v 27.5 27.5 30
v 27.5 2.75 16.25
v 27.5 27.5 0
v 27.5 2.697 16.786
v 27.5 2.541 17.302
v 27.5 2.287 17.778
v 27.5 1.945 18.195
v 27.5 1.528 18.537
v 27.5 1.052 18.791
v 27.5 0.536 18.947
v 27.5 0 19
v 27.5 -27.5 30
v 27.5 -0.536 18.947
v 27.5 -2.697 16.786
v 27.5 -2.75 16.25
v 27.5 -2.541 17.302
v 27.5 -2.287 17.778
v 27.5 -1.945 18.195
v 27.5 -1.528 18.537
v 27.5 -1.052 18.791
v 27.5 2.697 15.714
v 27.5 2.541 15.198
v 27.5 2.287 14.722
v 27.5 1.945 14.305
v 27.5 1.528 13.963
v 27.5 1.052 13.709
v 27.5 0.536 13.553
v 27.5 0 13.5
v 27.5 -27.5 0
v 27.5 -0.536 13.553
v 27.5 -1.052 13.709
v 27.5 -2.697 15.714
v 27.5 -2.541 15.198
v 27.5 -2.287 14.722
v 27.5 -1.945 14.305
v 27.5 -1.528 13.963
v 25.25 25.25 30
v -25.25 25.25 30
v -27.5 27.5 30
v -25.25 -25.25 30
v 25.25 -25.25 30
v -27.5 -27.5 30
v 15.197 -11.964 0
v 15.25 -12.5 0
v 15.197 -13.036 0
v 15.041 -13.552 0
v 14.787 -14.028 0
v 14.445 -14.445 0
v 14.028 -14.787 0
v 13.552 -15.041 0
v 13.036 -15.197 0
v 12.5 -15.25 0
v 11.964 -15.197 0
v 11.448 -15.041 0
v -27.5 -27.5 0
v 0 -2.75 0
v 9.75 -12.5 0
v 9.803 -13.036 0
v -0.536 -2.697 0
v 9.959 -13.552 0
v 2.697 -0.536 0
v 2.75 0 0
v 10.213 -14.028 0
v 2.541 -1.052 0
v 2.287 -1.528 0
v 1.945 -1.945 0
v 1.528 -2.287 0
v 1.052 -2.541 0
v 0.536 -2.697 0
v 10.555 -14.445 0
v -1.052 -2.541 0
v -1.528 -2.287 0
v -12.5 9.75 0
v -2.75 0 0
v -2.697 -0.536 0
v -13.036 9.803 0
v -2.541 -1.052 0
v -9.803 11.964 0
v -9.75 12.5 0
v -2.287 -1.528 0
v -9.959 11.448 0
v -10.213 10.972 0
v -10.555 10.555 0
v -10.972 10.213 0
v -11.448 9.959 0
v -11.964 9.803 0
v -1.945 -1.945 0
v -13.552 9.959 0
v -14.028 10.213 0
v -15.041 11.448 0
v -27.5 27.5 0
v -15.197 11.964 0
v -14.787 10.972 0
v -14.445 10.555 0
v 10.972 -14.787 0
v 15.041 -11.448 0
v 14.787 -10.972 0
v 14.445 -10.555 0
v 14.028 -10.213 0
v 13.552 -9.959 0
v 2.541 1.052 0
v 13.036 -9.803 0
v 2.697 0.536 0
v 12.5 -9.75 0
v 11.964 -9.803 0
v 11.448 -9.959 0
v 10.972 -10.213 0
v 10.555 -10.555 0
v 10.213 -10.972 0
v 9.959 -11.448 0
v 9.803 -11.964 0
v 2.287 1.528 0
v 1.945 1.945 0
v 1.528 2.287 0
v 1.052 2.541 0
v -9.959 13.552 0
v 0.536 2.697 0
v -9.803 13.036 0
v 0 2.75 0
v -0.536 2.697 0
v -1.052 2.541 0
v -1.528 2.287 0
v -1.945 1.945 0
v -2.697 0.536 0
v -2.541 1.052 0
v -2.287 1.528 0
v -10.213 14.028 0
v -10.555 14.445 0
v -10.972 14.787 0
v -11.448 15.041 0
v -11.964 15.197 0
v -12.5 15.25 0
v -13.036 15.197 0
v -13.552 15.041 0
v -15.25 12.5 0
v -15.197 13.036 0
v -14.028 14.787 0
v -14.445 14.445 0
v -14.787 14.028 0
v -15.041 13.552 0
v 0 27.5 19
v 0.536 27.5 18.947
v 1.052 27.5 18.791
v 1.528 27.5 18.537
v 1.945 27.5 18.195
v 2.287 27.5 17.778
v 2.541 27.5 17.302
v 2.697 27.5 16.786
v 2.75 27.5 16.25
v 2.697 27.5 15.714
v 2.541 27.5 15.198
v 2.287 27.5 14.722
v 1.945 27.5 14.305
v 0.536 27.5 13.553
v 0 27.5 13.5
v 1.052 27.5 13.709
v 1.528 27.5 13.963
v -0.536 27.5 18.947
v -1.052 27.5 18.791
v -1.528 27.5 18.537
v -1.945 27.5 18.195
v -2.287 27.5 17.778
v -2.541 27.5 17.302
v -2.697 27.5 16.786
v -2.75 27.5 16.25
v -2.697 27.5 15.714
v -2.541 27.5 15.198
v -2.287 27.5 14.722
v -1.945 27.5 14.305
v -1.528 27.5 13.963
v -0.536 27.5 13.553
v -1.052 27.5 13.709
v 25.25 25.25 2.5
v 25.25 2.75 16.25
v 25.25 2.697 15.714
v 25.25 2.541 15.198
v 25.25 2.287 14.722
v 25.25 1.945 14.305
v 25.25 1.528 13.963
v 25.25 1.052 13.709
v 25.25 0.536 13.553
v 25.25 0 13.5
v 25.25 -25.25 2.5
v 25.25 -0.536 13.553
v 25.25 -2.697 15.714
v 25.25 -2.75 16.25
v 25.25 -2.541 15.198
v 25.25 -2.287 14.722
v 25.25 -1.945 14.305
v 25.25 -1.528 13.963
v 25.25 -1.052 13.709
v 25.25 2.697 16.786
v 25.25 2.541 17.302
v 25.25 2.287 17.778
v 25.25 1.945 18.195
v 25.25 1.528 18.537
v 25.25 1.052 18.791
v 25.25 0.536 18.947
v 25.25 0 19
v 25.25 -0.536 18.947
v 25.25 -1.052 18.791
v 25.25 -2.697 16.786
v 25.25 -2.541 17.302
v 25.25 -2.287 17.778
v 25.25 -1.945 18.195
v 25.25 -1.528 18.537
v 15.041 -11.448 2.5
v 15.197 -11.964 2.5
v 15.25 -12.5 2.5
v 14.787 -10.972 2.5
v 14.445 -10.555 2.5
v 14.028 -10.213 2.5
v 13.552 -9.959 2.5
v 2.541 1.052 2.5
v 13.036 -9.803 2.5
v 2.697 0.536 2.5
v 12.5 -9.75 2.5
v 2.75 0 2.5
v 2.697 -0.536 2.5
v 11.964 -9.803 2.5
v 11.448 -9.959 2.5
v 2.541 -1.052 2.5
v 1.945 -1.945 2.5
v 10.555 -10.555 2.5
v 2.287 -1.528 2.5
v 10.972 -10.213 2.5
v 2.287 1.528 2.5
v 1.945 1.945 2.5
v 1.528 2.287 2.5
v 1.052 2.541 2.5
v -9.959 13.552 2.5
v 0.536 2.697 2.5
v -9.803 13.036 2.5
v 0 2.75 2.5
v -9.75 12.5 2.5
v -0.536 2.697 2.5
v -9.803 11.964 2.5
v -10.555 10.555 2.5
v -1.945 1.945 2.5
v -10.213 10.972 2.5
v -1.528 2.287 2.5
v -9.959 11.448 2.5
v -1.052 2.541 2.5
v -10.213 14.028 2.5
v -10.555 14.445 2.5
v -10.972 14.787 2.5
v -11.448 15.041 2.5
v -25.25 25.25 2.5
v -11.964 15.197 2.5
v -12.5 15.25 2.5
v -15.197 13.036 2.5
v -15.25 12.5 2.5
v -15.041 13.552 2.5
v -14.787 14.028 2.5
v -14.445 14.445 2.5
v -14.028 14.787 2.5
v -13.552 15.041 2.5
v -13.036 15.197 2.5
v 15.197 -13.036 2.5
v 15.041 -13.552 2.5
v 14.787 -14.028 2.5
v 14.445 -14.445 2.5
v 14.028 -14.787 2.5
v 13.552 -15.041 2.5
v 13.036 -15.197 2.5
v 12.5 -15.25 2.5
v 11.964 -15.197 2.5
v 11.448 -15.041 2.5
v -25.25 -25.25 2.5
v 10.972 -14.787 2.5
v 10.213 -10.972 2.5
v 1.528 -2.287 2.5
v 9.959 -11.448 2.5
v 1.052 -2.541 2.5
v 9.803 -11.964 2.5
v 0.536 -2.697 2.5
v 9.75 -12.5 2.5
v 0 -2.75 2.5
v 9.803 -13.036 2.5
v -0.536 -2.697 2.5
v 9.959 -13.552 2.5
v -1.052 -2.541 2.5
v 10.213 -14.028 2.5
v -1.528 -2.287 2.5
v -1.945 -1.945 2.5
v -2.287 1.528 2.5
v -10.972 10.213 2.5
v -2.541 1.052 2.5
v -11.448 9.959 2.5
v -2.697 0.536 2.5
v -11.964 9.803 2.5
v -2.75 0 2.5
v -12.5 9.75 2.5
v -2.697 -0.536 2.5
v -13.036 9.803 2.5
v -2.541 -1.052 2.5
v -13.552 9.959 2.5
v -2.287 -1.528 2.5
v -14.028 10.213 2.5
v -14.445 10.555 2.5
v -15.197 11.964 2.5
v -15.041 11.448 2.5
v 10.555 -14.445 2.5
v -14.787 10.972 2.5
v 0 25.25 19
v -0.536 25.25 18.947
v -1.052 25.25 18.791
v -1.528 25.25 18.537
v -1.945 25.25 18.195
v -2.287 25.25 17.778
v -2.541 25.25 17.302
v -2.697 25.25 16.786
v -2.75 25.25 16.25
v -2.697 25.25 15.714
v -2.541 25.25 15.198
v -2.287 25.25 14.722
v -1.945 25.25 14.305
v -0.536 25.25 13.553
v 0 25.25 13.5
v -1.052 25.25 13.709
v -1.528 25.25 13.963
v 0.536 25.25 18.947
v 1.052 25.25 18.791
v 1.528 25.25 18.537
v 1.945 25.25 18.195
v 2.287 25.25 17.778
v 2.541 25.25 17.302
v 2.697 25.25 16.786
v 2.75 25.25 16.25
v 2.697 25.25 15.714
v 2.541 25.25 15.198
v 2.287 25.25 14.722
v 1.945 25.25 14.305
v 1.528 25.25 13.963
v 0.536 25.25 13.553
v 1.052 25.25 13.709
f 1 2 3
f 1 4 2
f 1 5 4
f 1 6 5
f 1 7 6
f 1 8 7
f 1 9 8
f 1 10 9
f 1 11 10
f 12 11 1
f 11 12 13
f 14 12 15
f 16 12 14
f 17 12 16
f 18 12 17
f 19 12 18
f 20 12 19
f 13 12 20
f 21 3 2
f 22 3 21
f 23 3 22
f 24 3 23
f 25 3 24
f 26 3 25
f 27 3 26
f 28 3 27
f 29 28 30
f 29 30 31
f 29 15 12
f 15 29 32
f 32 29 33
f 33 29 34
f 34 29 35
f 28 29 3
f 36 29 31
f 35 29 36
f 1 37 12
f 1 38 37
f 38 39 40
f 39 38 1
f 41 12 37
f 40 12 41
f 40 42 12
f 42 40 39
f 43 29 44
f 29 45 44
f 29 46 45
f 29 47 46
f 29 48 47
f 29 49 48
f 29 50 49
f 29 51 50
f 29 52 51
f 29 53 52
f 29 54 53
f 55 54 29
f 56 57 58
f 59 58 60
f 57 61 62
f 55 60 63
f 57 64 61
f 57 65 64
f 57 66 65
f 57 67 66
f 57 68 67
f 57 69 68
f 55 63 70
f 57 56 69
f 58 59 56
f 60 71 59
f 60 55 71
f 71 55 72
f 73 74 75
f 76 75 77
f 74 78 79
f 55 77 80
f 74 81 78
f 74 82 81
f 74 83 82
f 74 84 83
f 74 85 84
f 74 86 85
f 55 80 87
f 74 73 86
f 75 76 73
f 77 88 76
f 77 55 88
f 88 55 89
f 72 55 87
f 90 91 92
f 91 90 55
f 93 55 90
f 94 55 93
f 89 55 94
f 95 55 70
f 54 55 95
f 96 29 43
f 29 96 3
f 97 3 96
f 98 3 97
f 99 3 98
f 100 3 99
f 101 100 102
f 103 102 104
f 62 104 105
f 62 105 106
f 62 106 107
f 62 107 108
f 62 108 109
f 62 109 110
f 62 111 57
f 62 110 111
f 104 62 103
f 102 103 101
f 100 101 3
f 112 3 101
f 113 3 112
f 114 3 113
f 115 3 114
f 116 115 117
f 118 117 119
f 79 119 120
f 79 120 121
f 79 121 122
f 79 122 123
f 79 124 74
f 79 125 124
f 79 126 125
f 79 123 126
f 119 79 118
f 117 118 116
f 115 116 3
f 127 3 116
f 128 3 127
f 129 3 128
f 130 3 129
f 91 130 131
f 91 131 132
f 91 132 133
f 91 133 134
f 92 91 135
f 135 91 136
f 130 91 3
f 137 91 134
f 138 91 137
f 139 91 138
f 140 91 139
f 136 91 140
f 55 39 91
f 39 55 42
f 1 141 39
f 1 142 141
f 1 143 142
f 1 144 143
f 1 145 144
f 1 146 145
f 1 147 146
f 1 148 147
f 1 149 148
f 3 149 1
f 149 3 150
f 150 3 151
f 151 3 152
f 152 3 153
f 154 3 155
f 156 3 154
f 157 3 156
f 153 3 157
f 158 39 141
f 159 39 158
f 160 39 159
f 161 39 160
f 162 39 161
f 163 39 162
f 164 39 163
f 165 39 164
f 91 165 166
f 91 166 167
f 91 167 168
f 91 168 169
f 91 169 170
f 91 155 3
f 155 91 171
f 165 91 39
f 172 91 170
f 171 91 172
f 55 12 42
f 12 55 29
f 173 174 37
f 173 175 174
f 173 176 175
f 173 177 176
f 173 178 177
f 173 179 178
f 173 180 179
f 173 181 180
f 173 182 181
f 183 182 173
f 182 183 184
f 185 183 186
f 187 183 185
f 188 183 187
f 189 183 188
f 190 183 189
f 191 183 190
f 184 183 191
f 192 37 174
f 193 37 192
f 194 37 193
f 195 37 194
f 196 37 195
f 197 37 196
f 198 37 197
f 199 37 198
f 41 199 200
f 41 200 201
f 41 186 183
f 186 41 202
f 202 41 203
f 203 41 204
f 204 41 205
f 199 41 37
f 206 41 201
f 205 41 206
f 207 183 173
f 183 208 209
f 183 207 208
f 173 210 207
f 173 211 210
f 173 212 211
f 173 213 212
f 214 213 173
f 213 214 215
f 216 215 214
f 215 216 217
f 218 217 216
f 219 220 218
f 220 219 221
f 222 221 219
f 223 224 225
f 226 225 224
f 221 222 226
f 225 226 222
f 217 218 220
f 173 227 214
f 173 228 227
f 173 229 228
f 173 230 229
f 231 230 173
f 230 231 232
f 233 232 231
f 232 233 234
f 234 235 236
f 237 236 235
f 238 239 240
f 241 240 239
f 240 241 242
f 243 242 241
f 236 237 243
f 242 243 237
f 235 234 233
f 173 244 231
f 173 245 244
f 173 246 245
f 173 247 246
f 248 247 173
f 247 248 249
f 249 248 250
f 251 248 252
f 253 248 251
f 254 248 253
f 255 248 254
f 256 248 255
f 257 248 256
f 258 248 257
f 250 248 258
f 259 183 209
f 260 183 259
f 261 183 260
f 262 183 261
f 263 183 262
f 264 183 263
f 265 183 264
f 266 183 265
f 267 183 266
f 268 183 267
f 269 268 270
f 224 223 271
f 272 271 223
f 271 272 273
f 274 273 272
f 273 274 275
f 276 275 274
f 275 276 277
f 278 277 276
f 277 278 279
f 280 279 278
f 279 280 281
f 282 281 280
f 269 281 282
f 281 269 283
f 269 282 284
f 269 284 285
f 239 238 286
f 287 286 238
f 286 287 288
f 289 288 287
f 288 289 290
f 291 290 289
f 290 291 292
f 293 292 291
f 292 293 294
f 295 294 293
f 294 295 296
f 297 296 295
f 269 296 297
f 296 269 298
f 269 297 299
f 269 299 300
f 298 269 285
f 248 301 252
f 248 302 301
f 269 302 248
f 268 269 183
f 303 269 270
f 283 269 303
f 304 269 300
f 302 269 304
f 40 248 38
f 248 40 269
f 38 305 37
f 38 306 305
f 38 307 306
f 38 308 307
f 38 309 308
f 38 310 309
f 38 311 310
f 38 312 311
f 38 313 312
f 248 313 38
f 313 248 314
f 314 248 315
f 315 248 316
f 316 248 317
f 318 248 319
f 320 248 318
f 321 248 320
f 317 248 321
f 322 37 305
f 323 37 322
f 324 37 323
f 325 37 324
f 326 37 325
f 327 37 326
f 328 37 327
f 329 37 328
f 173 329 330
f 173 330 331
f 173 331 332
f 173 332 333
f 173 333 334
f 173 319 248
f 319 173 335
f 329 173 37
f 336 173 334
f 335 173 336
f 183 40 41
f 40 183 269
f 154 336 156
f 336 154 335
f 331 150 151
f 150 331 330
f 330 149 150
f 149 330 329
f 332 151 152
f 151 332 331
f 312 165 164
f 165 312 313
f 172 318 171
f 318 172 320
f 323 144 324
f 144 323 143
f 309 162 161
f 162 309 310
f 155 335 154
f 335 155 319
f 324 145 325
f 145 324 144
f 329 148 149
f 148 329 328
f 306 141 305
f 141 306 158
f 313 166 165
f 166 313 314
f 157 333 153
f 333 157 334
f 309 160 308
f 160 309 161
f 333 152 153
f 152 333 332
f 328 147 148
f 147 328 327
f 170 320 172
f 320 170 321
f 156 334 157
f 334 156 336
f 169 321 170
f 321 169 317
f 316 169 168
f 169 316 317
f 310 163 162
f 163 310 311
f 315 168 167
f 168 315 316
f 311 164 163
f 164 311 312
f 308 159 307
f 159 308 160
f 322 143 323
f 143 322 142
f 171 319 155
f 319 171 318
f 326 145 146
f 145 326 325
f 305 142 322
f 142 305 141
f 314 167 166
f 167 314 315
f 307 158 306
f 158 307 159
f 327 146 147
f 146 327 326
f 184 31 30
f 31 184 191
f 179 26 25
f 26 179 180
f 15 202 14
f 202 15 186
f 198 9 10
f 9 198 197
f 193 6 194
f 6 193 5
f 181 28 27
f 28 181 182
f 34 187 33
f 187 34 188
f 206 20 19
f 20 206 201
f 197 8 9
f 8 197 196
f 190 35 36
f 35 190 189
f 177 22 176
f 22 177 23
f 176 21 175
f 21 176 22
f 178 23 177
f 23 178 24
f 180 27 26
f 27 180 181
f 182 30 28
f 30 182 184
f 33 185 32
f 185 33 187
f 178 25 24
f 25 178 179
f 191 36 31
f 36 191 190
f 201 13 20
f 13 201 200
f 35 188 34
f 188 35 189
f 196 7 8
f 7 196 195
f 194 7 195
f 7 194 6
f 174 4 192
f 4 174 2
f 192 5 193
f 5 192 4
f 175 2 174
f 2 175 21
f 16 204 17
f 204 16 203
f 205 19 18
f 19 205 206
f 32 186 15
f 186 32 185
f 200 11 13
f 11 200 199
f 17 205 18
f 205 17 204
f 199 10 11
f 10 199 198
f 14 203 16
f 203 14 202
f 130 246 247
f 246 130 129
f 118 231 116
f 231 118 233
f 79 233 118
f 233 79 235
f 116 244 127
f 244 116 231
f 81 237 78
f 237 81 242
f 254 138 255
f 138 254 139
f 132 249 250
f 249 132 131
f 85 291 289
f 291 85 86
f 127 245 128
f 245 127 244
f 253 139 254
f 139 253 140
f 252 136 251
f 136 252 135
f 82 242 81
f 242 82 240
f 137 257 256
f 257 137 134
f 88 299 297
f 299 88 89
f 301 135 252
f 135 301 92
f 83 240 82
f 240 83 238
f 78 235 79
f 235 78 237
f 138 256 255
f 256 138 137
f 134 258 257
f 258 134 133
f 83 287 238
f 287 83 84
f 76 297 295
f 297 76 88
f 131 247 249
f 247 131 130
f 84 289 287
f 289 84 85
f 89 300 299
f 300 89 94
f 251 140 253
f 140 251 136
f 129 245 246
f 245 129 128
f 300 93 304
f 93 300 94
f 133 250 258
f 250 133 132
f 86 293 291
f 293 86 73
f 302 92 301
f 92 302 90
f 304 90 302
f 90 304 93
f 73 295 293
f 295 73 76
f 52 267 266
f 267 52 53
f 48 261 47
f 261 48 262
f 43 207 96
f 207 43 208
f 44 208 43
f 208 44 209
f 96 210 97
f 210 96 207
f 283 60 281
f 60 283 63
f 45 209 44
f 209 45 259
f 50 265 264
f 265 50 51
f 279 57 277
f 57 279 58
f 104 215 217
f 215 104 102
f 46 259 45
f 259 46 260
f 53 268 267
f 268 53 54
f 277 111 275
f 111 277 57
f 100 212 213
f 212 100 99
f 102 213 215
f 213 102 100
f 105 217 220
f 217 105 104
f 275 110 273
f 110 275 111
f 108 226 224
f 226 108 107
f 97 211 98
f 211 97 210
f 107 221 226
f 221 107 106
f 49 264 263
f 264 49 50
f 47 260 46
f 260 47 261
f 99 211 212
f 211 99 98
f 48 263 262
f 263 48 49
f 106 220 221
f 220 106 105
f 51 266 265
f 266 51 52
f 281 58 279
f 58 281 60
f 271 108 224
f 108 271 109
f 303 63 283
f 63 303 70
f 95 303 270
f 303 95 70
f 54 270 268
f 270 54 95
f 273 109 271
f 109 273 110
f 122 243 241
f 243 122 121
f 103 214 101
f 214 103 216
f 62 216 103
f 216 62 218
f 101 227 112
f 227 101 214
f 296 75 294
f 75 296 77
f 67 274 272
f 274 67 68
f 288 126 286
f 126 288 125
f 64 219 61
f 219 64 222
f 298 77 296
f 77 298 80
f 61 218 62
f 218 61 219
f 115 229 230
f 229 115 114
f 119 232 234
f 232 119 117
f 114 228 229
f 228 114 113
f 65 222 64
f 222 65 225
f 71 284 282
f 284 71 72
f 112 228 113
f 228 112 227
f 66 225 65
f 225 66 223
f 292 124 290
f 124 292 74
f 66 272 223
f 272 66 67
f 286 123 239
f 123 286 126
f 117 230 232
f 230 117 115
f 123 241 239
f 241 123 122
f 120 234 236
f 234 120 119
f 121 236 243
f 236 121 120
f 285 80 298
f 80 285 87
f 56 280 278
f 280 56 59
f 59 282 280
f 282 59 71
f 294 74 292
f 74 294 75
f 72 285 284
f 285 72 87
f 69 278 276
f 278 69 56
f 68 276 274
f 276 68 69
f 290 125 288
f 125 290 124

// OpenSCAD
// file: shared.scad
// M5 CSK fitting 90deg bevel
// h - length of the drill bore including csk
// csk - diameter of the csk
// recess - recess of the csk, added above the csk
module m5csk(h=5, csk=10, recess=0) {
    m5bore(h=h);
    translate([0, 0, -(csk/2 - h)]) cylinder(d2=csk, d1=0, h=(csk/2), $fn=32);
    translate([0, 0, h]) cylinder(h=recess, d=csk);
}

// M5 clearance bore
// h - length of the bore
module m5bore(h=5) {
    cylinder(d=5.5, h=h, $fn=32);
}

module quarter_cylinder(r, h) {
    $fn=128;
    intersection() {
        cylinder(r=r, h=h);
        translate([0, 0, -0.05]) cube([r, r, h+0.1]);
    }
}

module ccube(size, center=false) {
    if(center){
        translate(-(size/2)) cube(size);
    } else {
        translate([-size.x/2, -size.y/2, 0]) cube(size);
    }
}
// main file
use <shared.scad>;

module outer() {
    difference() {
        ccube([55, 55, 30]);
        translate([0, 0, 2.5]) ccube([50.5, 50.5, 27.5]);
        rotate([-90, 0, 0]) translate([0, -16.25, 25]) m5bore();
        rotate([0, 90, 0]) translate([-16.25, 0, 25]) m5bore();
        translate([-12.5, 12.5, 0]) m5bore();
        translate([12.5, -12.5, 0]) m5bore();
        m5bore();
    }
}

outer();
